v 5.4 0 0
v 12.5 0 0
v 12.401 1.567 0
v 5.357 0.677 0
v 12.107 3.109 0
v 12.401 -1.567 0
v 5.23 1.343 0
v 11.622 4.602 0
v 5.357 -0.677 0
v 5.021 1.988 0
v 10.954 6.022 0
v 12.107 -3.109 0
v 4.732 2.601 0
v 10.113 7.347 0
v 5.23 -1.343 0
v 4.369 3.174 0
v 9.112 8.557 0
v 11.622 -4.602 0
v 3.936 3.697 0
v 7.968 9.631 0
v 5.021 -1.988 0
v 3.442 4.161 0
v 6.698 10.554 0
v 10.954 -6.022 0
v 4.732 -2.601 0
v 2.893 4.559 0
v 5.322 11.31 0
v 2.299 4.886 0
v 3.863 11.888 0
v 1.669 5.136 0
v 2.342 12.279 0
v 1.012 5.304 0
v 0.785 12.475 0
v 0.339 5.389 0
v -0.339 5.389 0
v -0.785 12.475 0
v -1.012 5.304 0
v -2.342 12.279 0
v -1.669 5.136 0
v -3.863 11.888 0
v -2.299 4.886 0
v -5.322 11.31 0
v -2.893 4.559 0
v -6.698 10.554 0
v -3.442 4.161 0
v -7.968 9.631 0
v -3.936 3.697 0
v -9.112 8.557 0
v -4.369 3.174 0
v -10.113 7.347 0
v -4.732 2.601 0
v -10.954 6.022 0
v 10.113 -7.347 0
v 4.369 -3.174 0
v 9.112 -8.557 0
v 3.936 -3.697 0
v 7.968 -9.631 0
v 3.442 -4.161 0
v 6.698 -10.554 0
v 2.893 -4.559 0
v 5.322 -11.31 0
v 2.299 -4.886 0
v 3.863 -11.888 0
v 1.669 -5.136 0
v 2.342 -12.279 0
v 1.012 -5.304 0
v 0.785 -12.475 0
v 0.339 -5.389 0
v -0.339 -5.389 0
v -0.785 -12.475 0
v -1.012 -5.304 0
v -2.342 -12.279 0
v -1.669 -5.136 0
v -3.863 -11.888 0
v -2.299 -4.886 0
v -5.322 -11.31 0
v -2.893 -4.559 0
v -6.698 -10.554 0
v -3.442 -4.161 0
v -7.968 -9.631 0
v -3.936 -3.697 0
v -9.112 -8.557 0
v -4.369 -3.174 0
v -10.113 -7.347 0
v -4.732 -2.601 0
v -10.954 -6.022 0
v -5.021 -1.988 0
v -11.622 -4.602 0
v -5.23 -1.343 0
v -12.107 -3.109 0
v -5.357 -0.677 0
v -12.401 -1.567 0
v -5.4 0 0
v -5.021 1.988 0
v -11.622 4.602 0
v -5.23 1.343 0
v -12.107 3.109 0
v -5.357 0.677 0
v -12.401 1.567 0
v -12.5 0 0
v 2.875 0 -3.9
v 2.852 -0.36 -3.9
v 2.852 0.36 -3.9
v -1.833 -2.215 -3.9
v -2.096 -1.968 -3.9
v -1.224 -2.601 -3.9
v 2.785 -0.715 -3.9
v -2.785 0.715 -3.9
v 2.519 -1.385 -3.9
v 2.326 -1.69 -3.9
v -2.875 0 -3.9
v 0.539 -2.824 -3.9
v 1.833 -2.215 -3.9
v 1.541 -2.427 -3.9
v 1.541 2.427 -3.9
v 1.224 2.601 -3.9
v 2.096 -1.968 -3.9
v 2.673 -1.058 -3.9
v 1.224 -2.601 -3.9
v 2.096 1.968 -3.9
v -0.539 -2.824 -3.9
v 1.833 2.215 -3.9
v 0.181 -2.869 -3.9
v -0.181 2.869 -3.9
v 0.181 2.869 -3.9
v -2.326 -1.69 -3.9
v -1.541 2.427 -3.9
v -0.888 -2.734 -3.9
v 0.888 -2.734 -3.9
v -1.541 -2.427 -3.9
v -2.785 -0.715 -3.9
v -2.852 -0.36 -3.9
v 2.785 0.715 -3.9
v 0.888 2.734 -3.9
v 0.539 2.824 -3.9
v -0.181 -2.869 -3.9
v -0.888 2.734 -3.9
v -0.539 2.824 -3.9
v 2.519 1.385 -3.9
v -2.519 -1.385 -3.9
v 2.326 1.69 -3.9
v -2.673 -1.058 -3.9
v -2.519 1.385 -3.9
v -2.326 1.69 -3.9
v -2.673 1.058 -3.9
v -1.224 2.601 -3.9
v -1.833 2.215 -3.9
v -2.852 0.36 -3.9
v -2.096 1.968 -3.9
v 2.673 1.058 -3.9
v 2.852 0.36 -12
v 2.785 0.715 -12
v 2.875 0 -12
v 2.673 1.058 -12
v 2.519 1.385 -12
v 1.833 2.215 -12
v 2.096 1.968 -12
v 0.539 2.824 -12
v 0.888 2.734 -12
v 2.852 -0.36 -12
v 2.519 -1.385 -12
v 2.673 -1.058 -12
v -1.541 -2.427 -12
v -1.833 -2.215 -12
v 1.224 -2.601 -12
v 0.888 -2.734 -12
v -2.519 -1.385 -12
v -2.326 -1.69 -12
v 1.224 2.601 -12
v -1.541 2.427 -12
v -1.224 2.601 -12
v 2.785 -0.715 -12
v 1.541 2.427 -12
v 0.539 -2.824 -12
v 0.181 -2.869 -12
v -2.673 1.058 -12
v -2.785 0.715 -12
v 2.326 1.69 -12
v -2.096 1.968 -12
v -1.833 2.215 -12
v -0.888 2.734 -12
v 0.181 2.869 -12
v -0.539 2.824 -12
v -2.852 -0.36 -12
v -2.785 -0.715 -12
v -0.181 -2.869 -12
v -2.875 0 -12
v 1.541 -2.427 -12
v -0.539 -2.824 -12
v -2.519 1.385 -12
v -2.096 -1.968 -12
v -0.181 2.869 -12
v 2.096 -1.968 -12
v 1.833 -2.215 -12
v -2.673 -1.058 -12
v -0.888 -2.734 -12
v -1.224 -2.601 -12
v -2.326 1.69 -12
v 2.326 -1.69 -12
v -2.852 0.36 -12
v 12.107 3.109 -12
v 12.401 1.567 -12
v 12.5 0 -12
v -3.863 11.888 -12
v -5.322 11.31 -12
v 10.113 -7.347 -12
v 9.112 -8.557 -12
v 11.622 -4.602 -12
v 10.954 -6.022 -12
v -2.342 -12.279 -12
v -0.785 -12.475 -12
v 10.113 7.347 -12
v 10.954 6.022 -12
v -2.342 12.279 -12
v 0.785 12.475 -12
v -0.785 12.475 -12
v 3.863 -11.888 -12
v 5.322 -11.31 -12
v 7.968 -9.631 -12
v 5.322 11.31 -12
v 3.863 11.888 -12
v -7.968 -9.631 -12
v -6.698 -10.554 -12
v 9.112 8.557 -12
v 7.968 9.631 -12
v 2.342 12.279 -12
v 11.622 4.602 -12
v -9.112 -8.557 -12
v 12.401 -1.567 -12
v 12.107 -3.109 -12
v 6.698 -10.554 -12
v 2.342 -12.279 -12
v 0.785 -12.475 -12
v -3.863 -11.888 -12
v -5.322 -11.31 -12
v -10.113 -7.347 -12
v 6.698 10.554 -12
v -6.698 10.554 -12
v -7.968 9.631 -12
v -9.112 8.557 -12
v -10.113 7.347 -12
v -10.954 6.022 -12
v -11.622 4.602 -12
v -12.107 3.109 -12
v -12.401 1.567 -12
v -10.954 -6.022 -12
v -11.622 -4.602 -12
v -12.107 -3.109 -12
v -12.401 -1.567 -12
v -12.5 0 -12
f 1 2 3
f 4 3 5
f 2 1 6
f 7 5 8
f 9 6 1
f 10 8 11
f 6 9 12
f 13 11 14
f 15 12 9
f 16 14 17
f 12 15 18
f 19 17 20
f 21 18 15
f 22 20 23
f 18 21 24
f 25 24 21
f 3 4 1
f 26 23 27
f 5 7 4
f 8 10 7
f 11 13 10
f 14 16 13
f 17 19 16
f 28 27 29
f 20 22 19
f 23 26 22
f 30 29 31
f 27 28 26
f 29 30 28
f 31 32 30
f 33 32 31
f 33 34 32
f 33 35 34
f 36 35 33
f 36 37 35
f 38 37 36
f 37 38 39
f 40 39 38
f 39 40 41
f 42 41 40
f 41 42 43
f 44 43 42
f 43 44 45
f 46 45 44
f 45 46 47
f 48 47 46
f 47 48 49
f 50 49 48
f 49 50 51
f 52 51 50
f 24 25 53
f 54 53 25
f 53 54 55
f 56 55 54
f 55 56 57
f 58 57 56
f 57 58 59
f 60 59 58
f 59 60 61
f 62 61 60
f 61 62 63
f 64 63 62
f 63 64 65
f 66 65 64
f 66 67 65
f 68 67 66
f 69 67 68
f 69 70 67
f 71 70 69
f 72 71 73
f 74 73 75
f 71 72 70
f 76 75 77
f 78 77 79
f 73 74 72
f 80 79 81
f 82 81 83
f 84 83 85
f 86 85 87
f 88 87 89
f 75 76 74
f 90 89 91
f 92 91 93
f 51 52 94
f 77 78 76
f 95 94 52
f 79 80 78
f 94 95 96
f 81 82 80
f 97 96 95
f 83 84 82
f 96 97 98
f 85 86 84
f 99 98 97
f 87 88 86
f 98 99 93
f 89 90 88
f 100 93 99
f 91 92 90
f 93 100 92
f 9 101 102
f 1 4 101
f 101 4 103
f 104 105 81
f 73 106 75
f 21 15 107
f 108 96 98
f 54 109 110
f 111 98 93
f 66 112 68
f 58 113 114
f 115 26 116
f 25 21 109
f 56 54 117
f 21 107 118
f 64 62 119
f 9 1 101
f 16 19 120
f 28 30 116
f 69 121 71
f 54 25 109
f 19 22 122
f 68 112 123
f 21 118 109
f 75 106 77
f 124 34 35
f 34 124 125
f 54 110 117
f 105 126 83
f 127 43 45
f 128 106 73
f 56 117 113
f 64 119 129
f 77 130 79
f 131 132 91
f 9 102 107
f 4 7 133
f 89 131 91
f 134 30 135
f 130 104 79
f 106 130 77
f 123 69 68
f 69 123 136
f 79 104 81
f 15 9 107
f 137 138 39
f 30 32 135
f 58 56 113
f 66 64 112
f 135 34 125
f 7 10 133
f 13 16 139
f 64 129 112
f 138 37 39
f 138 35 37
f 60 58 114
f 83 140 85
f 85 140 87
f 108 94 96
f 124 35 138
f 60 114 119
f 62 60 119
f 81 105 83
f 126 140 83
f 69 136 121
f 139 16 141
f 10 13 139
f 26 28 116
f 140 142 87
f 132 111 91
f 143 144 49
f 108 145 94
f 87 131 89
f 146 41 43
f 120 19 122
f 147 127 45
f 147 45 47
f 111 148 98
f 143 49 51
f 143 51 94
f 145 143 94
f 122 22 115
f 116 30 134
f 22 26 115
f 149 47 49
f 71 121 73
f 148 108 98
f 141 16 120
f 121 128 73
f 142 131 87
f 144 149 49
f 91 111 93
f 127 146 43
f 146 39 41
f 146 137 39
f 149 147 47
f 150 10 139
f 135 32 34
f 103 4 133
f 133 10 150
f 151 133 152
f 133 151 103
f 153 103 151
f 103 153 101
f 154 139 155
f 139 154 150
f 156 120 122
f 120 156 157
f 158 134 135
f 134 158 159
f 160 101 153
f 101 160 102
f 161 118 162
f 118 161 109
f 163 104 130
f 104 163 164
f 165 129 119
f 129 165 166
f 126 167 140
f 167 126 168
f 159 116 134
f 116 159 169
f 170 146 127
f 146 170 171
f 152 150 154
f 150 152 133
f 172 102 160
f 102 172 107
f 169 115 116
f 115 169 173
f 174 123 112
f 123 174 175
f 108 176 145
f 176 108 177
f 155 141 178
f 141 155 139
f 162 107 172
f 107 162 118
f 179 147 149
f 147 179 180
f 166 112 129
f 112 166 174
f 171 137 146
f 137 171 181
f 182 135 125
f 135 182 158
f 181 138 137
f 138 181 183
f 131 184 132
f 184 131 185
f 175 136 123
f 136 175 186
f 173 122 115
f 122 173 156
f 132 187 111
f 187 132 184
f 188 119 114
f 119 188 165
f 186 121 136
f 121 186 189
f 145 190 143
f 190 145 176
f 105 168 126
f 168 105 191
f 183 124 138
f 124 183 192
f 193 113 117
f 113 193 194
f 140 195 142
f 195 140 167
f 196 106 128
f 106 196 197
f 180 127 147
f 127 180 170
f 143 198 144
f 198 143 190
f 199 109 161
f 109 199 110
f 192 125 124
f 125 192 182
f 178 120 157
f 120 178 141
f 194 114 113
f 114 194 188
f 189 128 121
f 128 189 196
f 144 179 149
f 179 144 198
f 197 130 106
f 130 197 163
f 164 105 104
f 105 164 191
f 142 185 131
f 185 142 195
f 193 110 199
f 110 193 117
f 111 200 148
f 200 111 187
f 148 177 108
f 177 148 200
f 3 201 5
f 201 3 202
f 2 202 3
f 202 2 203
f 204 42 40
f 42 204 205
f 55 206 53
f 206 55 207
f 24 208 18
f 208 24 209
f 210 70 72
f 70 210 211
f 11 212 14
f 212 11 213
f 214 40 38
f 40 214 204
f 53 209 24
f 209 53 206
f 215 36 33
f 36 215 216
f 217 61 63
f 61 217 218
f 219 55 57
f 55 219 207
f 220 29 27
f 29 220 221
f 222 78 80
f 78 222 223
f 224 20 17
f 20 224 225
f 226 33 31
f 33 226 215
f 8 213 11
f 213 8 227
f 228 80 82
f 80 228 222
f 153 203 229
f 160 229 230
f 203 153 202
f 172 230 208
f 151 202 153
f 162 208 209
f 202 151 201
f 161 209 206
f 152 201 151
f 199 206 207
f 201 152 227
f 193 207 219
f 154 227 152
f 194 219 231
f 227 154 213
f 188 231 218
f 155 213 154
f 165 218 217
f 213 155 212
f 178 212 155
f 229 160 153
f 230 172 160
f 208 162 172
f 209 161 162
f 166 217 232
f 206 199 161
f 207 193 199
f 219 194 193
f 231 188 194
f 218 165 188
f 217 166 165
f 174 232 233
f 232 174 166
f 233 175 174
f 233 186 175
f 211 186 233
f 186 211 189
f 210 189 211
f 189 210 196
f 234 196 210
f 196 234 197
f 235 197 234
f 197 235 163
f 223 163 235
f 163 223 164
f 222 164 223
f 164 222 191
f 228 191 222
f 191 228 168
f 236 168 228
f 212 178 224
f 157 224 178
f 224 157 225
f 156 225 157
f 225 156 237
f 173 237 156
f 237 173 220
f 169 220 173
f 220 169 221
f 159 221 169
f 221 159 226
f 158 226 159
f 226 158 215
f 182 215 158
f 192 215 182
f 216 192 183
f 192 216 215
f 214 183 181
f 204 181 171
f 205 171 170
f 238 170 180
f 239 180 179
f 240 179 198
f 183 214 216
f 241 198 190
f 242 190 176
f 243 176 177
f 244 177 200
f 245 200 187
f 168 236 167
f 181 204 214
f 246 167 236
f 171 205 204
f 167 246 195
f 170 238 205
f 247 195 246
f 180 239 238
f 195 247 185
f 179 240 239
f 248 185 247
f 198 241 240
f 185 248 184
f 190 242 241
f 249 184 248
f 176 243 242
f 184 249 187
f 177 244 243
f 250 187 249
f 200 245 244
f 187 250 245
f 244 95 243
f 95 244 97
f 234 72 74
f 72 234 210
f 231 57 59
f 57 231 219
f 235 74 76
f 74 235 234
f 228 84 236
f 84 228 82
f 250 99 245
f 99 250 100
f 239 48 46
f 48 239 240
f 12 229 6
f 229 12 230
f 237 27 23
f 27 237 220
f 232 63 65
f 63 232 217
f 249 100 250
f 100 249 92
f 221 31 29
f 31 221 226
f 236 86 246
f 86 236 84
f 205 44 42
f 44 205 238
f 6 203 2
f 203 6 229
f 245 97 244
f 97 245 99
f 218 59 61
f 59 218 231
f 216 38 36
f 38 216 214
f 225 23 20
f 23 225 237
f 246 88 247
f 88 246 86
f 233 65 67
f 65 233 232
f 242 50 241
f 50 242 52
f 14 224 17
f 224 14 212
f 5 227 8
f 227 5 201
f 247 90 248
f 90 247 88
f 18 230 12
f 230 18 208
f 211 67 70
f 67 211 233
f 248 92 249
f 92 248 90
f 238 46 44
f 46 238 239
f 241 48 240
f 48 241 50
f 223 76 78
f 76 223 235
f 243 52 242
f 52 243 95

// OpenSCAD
$fn = 50;

difference() {
	union() {
		translate(v = [0, 0, -12.0]) {
			cylinder(h = 12, r = 12.5);
		}
	}
	union() {
		translate(v = [0, 0, 0]) {
			rotate(a = [0, 0, 0]) {
				difference() {
					union() {
						translate(v = [0, 0, -15.0]) {
							cylinder(h = 15, r = 2.6);
						}
						translate(v = [0, 0, -3.9]) {
							cylinder(h = 3.9, r1 = 2.875, r2 = 5.4);
						}
						translate(v = [0, 0, -15.0]) {
							cylinder(h = 15, r = 2.875);
						}
						translate(v = [0, 0, -15.0]) {
							cylinder(h = 15, r = 2.6);
						}
					}
					union();
				}
			}
		}
	}
}
